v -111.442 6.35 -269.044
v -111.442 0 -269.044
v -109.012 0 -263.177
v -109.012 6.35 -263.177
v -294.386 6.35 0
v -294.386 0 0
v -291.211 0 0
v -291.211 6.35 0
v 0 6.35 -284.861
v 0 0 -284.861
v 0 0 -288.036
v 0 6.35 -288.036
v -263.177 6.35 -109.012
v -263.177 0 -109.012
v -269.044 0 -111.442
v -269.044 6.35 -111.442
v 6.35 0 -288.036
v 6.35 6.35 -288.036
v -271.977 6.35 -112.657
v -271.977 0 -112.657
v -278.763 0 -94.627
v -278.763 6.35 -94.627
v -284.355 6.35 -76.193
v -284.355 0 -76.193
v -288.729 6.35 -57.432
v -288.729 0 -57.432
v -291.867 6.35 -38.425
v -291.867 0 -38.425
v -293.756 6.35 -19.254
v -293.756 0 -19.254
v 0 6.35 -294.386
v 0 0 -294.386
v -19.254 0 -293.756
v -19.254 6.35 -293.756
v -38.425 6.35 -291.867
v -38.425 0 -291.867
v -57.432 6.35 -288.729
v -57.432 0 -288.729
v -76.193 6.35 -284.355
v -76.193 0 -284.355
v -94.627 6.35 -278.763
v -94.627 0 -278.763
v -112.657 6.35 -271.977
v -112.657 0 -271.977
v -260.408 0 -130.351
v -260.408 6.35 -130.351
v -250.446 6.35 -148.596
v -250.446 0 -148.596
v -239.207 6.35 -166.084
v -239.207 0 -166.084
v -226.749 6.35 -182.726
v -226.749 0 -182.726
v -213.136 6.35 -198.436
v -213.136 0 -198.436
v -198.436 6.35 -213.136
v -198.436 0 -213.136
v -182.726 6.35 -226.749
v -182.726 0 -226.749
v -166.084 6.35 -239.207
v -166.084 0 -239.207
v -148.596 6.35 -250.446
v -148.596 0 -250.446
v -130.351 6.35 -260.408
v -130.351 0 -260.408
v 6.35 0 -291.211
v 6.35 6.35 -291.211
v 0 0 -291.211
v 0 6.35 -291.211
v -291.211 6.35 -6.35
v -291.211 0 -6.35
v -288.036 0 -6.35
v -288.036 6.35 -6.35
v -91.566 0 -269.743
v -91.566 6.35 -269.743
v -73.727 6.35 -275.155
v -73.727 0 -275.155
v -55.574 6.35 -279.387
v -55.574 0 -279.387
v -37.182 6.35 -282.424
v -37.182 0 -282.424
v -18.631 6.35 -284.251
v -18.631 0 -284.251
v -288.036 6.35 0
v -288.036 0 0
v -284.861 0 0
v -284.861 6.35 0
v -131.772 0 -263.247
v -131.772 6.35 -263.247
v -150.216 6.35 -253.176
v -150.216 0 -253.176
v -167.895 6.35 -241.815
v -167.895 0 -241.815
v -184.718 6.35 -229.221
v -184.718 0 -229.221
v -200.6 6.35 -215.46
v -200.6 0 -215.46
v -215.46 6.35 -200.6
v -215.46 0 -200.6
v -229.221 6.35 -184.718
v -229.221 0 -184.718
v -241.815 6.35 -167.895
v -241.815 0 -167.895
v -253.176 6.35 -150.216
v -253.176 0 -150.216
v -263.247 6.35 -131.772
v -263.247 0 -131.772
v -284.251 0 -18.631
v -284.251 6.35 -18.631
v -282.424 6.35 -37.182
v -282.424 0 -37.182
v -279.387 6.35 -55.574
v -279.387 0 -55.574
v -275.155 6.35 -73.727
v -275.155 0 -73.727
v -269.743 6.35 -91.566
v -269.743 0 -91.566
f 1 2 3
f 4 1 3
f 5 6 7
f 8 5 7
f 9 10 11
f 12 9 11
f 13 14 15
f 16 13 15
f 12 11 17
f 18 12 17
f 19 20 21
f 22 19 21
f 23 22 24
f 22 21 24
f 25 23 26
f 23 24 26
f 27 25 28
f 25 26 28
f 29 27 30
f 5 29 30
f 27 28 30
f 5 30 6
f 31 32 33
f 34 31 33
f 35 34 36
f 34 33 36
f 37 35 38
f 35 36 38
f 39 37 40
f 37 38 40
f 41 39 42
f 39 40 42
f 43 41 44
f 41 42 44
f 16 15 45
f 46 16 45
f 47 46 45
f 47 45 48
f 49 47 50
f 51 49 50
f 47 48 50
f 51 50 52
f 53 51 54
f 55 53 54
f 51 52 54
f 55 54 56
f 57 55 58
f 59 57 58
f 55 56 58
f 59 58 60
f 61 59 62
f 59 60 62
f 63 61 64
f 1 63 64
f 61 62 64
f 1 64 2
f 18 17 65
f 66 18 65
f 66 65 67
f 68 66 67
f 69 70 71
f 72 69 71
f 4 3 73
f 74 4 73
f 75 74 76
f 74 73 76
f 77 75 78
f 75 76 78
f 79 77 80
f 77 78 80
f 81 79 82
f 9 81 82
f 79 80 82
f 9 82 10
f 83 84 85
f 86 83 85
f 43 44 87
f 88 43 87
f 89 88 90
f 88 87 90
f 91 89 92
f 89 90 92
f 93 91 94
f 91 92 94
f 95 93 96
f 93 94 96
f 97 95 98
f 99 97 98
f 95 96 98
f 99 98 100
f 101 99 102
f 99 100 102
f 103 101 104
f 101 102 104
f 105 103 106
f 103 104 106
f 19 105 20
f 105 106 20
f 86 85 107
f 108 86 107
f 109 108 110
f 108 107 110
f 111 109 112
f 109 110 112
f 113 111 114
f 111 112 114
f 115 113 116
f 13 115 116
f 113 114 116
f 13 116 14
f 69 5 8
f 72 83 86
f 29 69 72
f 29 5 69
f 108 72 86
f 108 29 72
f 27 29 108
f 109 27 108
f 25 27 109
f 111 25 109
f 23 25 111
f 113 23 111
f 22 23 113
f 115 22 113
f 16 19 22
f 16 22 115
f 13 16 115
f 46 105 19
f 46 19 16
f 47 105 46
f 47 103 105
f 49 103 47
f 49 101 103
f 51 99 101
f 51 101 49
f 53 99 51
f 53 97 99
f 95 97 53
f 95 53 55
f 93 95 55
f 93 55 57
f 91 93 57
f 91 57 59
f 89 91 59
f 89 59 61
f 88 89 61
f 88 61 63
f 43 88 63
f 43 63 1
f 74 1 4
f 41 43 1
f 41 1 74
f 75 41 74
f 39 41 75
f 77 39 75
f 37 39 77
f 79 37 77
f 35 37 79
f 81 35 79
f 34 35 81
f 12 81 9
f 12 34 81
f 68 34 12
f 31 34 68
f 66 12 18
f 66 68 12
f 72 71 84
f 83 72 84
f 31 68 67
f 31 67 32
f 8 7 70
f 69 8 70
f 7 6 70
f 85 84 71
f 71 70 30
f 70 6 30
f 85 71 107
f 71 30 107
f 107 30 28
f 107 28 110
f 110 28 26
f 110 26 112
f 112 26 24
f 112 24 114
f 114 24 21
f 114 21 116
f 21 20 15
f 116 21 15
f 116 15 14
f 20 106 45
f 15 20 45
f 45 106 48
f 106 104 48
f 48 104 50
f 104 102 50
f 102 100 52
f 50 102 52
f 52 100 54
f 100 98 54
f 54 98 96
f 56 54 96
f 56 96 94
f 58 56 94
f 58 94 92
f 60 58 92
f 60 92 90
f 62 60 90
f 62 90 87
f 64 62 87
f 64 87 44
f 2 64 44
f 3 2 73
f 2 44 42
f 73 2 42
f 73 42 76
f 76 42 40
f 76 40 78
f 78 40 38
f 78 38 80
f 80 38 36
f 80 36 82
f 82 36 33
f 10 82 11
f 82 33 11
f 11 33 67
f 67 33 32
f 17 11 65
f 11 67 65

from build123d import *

# Parameters (mm, degrees)
BOSS_EXTRUDE1_DEPTH = 6.35


with BuildPart() as part:
    # Sketch1 → Boss-Extrude1 (new body)
    with BuildSketch(Plane(origin=(0, 0, 0), x_dir=(1, 0, 0), z_dir=(0, 1, 0))):
        with BuildLine():
            ThreePointArc((-109.011585227, 263.177247511), (-55.57362422, 279.387475761), (0, 284.861))
            Line((0, 284.861), (0, 288.036))
            Line((0, 288.036), (6.35, 288.036))
            Line((6.35, 288.036), (6.35, 291.211))
            Line((6.35, 291.211), (0, 291.211))
            Line((0, 291.211), (0, 294.386))
            ThreePointArc((0, 294.386), (-57.431859537, 288.729455557), (-112.65664492, 271.977200058))
            Line((-112.65664492, 271.977200058), (-111.441625022, 269.043882542))
            Line((-111.441625022, 269.043882542), (-109.011585227, 263.177247511))
        make_face()
        with BuildLine():
            ThreePointArc((-269.043882542, 111.441625022), (-205.917272856, 205.917272856), (-111.441625022, 269.043882542))
            Line((-111.441625022, 269.043882542), (-112.65664492, 271.977200058))
            ThreePointArc((-112.65664492, 271.977200058), (-208.162336886, 208.162336886), (-271.977200058, 112.65664492))
            Line((-271.977200058, 112.65664492), (-269.043882542, 111.441625022))
        make_face()
        with BuildLine():
            Line((-263.177247511, 109.011585227), (-269.043882542, 111.441625022))
            Line((-269.043882542, 111.441625022), (-271.977200058, 112.65664492))
            ThreePointArc((-271.977200058, 112.65664492), (-288.729455557, 57.431859537), (-294.386, 0))
            Line((-294.386, 0), (-291.211, 0))
            Line((-291.211, 0), (-291.211, 6.35))
            Line((-291.211, 6.35), (-288.036, 6.35))
            Line((-288.036, 6.35), (-288.036, 0))
            Line((-288.036, 0), (-284.861, 0))
            ThreePointArc((-284.861, 0), (-279.387475761, 55.57362422), (-263.177247511, 109.011585227))
        make_face()
    extrude(amount=BOSS_EXTRUDE1_DEPTH)


solid = part.part
